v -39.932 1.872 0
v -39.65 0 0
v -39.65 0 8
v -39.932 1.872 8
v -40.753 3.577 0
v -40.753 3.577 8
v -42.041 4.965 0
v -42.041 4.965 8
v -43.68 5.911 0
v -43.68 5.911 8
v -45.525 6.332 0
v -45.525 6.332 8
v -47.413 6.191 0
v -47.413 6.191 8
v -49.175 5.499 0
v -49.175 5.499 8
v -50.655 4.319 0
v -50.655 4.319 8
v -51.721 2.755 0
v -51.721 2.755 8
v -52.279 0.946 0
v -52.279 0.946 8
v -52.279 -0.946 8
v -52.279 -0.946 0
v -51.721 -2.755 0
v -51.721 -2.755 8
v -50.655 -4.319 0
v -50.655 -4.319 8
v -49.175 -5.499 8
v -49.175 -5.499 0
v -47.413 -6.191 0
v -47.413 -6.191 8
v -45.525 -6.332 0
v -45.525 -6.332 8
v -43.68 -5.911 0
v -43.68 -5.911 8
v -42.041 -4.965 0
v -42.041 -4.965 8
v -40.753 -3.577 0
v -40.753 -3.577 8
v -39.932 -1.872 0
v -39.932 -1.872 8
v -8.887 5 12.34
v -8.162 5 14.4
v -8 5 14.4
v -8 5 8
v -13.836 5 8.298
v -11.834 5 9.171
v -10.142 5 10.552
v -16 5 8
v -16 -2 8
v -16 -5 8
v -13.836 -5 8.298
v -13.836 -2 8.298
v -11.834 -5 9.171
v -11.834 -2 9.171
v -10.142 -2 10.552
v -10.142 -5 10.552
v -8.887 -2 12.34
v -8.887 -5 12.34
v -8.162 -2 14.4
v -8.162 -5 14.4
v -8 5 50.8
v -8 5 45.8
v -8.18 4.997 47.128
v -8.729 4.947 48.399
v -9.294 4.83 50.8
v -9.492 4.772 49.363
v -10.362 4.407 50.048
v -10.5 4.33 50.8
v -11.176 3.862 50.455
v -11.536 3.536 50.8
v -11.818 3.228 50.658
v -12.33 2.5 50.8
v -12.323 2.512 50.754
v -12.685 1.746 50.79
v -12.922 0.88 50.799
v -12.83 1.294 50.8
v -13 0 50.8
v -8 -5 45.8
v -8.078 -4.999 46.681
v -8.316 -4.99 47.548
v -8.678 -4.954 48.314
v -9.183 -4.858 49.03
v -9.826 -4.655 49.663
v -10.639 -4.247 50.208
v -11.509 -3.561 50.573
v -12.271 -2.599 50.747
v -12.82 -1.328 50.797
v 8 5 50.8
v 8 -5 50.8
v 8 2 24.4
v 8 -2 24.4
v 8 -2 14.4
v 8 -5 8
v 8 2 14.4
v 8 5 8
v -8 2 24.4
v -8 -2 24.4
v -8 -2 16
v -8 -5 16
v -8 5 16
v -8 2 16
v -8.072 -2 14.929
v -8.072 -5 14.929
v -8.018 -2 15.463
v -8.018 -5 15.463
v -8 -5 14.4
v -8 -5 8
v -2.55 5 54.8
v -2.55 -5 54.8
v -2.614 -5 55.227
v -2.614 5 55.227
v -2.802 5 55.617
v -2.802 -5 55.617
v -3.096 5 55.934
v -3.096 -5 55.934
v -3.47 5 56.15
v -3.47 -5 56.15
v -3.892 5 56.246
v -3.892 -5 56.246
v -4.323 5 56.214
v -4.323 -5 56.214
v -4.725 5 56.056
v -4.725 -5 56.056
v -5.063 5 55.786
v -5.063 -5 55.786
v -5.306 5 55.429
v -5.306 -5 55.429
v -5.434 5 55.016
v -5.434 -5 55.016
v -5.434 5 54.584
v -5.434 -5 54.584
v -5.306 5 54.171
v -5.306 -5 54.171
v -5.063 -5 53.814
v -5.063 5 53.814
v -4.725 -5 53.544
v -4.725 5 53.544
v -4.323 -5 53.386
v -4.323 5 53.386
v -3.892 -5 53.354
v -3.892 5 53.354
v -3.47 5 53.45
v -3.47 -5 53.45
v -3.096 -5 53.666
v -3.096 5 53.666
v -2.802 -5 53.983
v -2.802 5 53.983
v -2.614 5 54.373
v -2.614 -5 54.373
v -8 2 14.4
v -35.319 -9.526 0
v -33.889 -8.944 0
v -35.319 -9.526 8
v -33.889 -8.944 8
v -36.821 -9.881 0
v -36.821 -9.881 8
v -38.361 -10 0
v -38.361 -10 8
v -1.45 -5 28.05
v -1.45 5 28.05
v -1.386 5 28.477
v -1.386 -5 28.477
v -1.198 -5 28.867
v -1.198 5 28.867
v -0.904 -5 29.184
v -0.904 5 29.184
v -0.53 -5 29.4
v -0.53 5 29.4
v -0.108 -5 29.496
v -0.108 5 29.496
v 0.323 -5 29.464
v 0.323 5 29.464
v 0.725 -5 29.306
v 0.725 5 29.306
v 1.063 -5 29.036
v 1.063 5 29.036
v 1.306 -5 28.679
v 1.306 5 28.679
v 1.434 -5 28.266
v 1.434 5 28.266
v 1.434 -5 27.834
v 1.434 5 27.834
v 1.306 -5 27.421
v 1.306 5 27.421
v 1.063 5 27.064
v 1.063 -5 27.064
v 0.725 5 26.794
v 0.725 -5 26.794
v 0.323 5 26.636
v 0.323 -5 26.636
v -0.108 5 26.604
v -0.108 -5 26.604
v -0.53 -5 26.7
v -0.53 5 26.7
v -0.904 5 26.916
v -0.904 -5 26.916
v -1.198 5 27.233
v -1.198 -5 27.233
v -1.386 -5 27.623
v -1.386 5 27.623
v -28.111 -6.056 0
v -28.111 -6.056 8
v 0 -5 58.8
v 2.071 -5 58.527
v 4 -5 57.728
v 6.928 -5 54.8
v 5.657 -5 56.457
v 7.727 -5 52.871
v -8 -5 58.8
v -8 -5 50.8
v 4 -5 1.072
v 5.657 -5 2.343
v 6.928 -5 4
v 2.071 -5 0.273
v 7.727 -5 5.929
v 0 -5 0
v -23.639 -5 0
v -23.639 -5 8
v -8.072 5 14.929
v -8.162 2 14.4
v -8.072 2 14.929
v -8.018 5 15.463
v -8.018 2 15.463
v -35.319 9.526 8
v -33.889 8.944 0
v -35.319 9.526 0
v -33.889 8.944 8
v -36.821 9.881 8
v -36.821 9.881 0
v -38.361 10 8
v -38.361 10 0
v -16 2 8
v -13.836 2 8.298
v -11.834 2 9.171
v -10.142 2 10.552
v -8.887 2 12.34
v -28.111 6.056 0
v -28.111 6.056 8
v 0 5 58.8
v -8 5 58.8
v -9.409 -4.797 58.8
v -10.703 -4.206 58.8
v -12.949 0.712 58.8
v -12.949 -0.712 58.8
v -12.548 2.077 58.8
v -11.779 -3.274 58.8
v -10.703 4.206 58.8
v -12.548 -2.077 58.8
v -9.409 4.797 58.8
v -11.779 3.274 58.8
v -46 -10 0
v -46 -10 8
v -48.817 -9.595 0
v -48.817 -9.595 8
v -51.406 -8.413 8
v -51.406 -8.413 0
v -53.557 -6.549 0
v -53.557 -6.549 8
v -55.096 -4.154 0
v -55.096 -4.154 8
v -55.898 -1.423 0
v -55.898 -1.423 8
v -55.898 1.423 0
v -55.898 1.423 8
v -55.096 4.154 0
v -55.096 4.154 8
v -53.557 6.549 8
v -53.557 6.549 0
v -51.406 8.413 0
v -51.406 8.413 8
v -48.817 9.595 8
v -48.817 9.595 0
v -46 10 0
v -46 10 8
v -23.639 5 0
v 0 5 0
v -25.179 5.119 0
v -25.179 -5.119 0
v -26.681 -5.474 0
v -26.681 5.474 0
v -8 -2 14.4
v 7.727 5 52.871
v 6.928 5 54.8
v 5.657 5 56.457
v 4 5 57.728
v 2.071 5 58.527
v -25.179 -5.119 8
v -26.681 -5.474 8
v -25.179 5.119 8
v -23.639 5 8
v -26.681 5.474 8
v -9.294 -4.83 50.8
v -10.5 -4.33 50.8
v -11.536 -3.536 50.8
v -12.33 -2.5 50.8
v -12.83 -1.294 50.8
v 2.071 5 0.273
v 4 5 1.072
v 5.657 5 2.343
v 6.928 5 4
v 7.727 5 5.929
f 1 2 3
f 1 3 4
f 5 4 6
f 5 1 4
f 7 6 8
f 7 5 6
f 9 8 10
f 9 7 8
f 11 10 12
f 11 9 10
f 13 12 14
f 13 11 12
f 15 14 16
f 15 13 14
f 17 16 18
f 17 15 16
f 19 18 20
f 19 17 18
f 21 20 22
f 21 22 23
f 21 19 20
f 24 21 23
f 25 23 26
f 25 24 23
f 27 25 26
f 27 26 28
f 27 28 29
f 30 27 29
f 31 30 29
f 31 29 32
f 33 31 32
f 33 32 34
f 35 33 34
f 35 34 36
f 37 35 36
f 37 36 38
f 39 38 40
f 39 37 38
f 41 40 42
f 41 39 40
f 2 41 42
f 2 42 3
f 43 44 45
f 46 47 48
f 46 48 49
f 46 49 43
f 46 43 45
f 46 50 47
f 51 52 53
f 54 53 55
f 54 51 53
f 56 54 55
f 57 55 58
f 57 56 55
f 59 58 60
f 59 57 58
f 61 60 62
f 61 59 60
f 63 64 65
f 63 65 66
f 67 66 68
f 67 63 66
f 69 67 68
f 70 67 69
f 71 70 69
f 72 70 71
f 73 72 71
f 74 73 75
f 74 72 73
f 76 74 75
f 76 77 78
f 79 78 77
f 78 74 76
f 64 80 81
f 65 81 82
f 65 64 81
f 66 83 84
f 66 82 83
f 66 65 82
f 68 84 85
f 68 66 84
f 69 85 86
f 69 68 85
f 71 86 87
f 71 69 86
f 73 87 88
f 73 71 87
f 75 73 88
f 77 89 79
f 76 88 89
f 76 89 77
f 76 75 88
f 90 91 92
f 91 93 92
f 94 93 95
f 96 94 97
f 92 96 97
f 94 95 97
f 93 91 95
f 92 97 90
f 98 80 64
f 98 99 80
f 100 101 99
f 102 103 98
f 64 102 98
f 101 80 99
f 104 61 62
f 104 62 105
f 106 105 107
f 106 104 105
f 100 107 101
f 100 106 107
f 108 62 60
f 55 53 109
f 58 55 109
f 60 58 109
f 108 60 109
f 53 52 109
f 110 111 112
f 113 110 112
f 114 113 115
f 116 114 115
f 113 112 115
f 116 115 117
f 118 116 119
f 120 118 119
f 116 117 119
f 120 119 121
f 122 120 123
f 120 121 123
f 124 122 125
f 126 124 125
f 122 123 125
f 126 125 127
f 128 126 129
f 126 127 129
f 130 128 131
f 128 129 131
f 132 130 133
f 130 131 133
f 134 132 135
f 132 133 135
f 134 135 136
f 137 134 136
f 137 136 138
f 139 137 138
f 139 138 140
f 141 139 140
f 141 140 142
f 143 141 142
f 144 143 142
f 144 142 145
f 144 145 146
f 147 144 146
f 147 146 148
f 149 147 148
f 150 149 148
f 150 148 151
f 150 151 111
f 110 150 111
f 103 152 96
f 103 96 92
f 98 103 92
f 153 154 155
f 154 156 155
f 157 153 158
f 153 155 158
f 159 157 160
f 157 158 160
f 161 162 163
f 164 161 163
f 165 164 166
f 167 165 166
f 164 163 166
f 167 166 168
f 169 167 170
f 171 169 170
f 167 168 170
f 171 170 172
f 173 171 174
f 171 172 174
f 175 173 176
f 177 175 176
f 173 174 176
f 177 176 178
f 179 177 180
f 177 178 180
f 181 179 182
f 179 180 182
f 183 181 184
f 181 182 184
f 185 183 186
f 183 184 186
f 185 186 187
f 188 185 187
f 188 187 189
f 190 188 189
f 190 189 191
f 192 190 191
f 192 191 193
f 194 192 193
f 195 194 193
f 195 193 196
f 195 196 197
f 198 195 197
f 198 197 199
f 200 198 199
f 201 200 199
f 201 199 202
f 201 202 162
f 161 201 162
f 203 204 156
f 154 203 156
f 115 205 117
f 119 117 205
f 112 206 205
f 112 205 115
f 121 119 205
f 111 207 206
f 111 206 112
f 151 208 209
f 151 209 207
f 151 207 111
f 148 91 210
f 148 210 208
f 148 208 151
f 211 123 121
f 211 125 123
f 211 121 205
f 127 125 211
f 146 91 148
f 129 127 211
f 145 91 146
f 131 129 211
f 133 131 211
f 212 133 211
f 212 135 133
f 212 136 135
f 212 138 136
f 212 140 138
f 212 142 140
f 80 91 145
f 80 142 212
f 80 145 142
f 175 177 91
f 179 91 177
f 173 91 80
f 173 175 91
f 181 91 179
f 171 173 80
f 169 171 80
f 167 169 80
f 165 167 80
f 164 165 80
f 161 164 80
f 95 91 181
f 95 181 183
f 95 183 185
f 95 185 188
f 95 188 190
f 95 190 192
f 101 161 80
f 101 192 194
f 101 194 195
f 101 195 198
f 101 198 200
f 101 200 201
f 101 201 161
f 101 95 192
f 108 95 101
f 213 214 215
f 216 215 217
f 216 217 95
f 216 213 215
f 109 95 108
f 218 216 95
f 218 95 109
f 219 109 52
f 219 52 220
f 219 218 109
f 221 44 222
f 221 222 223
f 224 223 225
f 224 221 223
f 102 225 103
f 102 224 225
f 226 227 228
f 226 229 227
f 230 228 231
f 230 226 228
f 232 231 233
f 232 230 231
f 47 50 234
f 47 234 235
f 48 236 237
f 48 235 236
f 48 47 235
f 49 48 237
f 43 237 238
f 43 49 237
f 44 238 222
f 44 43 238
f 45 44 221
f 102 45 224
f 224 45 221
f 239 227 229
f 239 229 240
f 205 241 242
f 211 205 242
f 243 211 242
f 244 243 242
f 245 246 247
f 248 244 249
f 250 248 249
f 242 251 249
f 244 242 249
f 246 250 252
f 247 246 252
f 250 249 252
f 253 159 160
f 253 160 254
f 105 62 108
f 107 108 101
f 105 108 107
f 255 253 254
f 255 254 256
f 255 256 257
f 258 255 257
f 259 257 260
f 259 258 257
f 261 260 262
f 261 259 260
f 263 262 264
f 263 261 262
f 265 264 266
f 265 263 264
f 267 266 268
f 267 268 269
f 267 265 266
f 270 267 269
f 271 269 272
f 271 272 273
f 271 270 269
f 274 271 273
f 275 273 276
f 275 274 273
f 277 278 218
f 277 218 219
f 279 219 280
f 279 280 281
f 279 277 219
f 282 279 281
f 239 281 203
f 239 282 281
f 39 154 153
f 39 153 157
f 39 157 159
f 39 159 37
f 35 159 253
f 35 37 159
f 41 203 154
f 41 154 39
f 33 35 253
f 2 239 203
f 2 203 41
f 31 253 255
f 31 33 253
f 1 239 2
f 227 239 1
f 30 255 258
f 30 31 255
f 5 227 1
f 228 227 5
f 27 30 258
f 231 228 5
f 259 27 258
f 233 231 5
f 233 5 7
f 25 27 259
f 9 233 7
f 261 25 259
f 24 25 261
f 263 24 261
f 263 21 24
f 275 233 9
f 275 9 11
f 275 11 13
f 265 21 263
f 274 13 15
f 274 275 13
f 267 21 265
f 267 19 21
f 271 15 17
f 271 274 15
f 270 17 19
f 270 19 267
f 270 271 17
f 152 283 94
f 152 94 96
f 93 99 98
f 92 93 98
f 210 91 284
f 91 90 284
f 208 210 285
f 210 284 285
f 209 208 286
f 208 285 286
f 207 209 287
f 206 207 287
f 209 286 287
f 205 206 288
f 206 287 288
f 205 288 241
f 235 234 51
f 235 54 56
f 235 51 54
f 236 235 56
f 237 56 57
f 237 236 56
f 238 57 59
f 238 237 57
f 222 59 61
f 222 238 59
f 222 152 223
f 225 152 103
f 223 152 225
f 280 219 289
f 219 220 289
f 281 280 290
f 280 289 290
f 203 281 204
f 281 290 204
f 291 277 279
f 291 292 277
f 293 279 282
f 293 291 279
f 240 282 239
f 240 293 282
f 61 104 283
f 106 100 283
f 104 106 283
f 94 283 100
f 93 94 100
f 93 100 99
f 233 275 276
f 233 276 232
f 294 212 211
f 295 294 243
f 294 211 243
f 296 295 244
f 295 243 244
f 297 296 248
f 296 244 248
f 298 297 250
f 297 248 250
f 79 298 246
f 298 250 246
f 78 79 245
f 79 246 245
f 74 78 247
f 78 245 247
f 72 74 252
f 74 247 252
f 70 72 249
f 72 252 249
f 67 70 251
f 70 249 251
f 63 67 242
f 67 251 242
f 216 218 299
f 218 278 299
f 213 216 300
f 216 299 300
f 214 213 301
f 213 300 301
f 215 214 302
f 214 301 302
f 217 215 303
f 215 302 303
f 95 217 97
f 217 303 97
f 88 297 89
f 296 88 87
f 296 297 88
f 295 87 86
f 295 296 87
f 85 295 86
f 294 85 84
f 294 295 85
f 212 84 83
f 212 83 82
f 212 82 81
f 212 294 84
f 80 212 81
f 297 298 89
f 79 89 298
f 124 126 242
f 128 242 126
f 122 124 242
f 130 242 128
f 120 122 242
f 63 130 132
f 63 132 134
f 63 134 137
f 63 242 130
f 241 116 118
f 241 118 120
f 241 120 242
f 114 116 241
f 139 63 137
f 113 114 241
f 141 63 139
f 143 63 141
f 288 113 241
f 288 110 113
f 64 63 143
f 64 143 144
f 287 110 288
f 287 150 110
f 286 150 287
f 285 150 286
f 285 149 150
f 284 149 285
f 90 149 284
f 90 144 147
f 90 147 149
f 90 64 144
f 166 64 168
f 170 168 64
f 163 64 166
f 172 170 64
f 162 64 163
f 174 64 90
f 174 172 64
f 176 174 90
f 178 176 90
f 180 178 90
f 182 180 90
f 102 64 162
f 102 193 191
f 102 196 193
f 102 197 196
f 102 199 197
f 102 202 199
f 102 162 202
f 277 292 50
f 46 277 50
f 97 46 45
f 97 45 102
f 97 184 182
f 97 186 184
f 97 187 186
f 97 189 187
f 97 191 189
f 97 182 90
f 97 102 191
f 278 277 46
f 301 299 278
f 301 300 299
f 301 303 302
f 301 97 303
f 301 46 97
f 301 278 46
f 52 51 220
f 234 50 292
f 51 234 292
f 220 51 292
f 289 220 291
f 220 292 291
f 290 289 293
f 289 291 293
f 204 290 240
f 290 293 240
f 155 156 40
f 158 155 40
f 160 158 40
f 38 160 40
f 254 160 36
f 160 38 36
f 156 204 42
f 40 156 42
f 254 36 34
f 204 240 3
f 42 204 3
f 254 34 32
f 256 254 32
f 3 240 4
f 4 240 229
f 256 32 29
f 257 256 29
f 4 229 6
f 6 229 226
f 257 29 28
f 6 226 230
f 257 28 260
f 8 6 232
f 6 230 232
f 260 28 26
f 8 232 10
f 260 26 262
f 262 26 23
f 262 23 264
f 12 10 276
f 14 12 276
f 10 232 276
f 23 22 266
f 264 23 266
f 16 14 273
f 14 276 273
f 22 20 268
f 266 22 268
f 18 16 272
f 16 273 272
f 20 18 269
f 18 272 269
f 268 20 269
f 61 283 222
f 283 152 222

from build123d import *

# Parameters (mm, degrees)
SKETCH1_W           = 16
SKETCH1_H           = 10
BOSS_EXTRUDE1_DEPTH = 58.8
BOSS_EXTRUDE2_DEPTH = 8
SKETCH4_R           = 6.35
BOSS_EXTRUDE4_DEPTH = 8
SKETCH7_R           = 1.45
CUT_EXTRUDE1_DEPTH  = 83.573845738
SKETCH13_R          = 1.45
CUT_EXTRUDE5_DEPTH  = 83.573845738
SKETCH14_W          = 10
SKETCH14_H          = 4
CUT_EXTRUDE6_DEPTH  = 77.560041797
FILLET1_R           = 8
FILLET4_R           = 10
FILLET5_R           = 5
FILLET6_R           = 8


with BuildPart() as part:
    # Sketch1 → Boss-Extrude1 (new body)
    with BuildSketch(Plane.XY):
        Rectangle(SKETCH1_W, SKETCH1_H)
    extrude(amount=BOSS_EXTRUDE1_DEPTH)

    # Sketch2 → Boss-Extrude2 (add)
    with BuildSketch(Plane.XY.offset(58.8)):
        with BuildLine():
            Line((-8, 5), (-8, -5))
            ThreePointArc((-8, -5), (-13, 0), (-8, 5))
        make_face()
    extrude(amount=-BOSS_EXTRUDE2_DEPTH)

    # Sketch4 → Boss-Extrude4 (add)
    with BuildSketch(Plane.XY):
        with BuildLine():
            Line((-8, 5), (-8, -5))
            Line((-8, -5), (-26, -5))
            Line((-26, -5), (-36, -10))
            Line((-36, -10), (-46, -10))
            ThreePointArc((-46, -10), (-56, 0), (-46, 10))
            Line((-46, 10), (-36, 10))
            Line((-36, 10), (-26, 5))
            Line((-26, 5), (-8, 5))
        make_face()
        with Locations((-46, 0)):
            Circle(SKETCH4_R, mode=Mode.SUBTRACT)
    extrude(amount=BOSS_EXTRUDE4_DEPTH)

    # Sketch7 → Cut-Extrude1 (cut, through all)
    with BuildSketch(Plane.XZ.offset(5)):
        with Locations((-4, 54.8)):
            Circle(SKETCH7_R)
    extrude(amount=-CUT_EXTRUDE1_DEPTH, mode=Mode.SUBTRACT)

    # Sketch13 → Cut-Extrude5 (cut, through all)
    with BuildSketch(Plane(origin=(0, 5, 0), x_dir=(1, 0, 0), z_dir=(0, 1, 0))):
        with Locations(Location((0, -28.05, 0), (0, 0, 180))):
            Circle(SKETCH13_R)
    extrude(amount=-CUT_EXTRUDE5_DEPTH, mode=Mode.SUBTRACT)

    # Sketch14 → Cut-Extrude6 (cut, through all)
    with BuildSketch(Plane.ZY.offset(8)):
        with Locations((19.4, 0)):
            Rectangle(SKETCH14_W, SKETCH14_H)
    extrude(amount=-CUT_EXTRUDE6_DEPTH, mode=Mode.SUBTRACT)

    # Fillet1
    fillet1_edges = [part.edges().sort_by_distance(p)[0] for p in [
        (8, 0, 58.8),
        (8, 0, 0),
    ]]
    fillet(fillet1_edges, radius=FILLET1_R)

    # Fillet4
    fillet4_edges = [part.edges().sort_by_distance(p)[0] for p in [
        (-26, 5, 4),
        (-36, 10, 4),
        (-36, -10, 4),
        (-26, -5, 4),
    ]]
    fillet(fillet4_edges, radius=FILLET4_R)

    # Fillet5
    # the kernel refuses this fillet: 5 mm, written as the material it adds along each edge
    with BuildSketch(Plane(origin=(-8, 17.5, 50.8), x_dir=(0, 0, -1), z_dir=(0, -1, 0))) as fillet5_piece_1_section:
        with BuildLine():
            CenterArc((FILLET5_R, -FILLET5_R), FILLET5_R, 90, 90)
            Line((0, -FILLET5_R), (0, 0))
            Line((0, 0), (FILLET5_R, 0))
        make_face()
    fillet5_piece_1 = extrude(amount=35, mode=Mode.PRIVATE)
    fillet5_piece_1 = fillet5_piece_1 & Plane(origin=(-8, 0, 49.649047906), x_dir=(0, -1, 0), z_dir=(0, 0, 1)) * Cylinder(5, 90, mode=Mode.PRIVATE)
    add(fillet5_piece_1)

    # Fillet6
    # the kernel refuses this fillet: 8 mm, written as the material it adds along each edge
    with BuildSketch(Plane(origin=(-8, 5, 8), x_dir=(-1, 0, 0), z_dir=(0, -1, 0))) as fillet6_piece_1_section:
        with BuildLine():
            CenterArc((FILLET6_R, -FILLET6_R), FILLET6_R, 90, 90)
            Line((0, -FILLET6_R), (0, 0))
            Line((0, 0), (FILLET6_R, 0))
        make_face()
    fillet6_piece_1 = extrude(amount=10, mode=Mode.PRIVATE)
    fillet6_piece_1 = split(fillet6_piece_1, bisect_by=Plane(origin=(-9.850932113, 2, 9.698021043), z_dir=(0, 1, 0)), keep=Keep.TOP, mode=Mode.PRIVATE)
    fillet6_piece_1 = split(fillet6_piece_1, bisect_by=Plane(origin=(-9.850932113, 3.5, 14.4), z_dir=(0, 0, -1)), keep=Keep.TOP, mode=Mode.PRIVATE)
    add(fillet6_piece_1)
    with BuildSketch(Plane(origin=(-8, 5, 8), x_dir=(-1, 0, 0), z_dir=(0, -1, 0))) as fillet6_piece_2_section:
        with BuildLine():
            CenterArc((FILLET6_R, -FILLET6_R), FILLET6_R, 90, 90)
            Line((0, -FILLET6_R), (0, 0))
            Line((0, 0), (FILLET6_R, 0))
        make_face()
    fillet6_piece_2 = extrude(amount=10, mode=Mode.PRIVATE)
    fillet6_piece_2 = split(fillet6_piece_2, bisect_by=Plane(origin=(-7.952247513, 2, 15.099340059), z_dir=(0, 1, 0)), keep=Keep.TOP, mode=Mode.PRIVATE)
    fillet6_piece_2 = split(fillet6_piece_2, bisect_by=Plane(origin=(-7.952247513, 3.5, 14.4), z_dir=(0, 0, 1)), keep=Keep.TOP, mode=Mode.PRIVATE)
    add(fillet6_piece_2)
    with BuildSketch(Plane(origin=(-8, 5, 8), x_dir=(-1, 0, 0), z_dir=(0, -1, 0))) as fillet6_piece_3_section:
        with BuildLine():
            CenterArc((FILLET6_R, -FILLET6_R), FILLET6_R, 90, 90)
            Line((0, -FILLET6_R), (0, 0))
            Line((0, 0), (FILLET6_R, 0))
        make_face()
    fillet6_piece_3 = extrude(amount=10, mode=Mode.PRIVATE)
    fillet6_piece_3 = split(fillet6_piece_3, bisect_by=Plane(origin=(-9.850932113, 2, 9.698021043), z_dir=(0, -1, 0)), keep=Keep.TOP, mode=Mode.PRIVATE)
    fillet6_piece_3 = split(fillet6_piece_3, bisect_by=Plane(origin=(-9.850932113, -2, 9.698021043), z_dir=(0, 1, 0)), keep=Keep.TOP, mode=Mode.PRIVATE)
    fillet6_piece_3 = split(fillet6_piece_3, bisect_by=Plane(origin=(-9.850932113, 0, 14.4), z_dir=(0, 0, -1)), keep=Keep.TOP, mode=Mode.PRIVATE)
    add(fillet6_piece_3)
    with BuildSketch(Plane(origin=(-8, 5, 8), x_dir=(-1, 0, 0), z_dir=(0, -1, 0))) as fillet6_piece_4_section:
        with BuildLine():
            CenterArc((FILLET6_R, -FILLET6_R), FILLET6_R, 90, 90)
            Line((0, -FILLET6_R), (0, 0))
            Line((0, 0), (FILLET6_R, 0))
        make_face()
    fillet6_piece_4 = extrude(amount=10, mode=Mode.PRIVATE)
    fillet6_piece_4 = split(fillet6_piece_4, bisect_by=Plane(origin=(-9.850932113, -2, 9.698021043), z_dir=(0, -1, 0)), keep=Keep.TOP, mode=Mode.PRIVATE)
    fillet6_piece_4 = split(fillet6_piece_4, bisect_by=Plane(origin=(-9.850932113, -3.5, 14.4), z_dir=(0, 0, -1)), keep=Keep.TOP, mode=Mode.PRIVATE)
    add(fillet6_piece_4)
    with BuildSketch(Plane(origin=(-8, 5, 8), x_dir=(-1, 0, 0), z_dir=(0, -1, 0))) as fillet6_piece_5_section:
        with BuildLine():
            CenterArc((FILLET6_R, -FILLET6_R), FILLET6_R, 90, 90)
            Line((0, -FILLET6_R), (0, 0))
            Line((0, 0), (FILLET6_R, 0))
        make_face()
    fillet6_piece_5 = extrude(amount=10, mode=Mode.PRIVATE)
    fillet6_piece_5 = split(fillet6_piece_5, bisect_by=Plane(origin=(-7.952247513, -2, 15.099340059), z_dir=(0, -1, 0)), keep=Keep.TOP, mode=Mode.PRIVATE)
    fillet6_piece_5 = split(fillet6_piece_5, bisect_by=Plane(origin=(-7.952247513, -3.5, 14.4), z_dir=(0, 0, 1)), keep=Keep.TOP, mode=Mode.PRIVATE)
    add(fillet6_piece_5)


solid = part.part
